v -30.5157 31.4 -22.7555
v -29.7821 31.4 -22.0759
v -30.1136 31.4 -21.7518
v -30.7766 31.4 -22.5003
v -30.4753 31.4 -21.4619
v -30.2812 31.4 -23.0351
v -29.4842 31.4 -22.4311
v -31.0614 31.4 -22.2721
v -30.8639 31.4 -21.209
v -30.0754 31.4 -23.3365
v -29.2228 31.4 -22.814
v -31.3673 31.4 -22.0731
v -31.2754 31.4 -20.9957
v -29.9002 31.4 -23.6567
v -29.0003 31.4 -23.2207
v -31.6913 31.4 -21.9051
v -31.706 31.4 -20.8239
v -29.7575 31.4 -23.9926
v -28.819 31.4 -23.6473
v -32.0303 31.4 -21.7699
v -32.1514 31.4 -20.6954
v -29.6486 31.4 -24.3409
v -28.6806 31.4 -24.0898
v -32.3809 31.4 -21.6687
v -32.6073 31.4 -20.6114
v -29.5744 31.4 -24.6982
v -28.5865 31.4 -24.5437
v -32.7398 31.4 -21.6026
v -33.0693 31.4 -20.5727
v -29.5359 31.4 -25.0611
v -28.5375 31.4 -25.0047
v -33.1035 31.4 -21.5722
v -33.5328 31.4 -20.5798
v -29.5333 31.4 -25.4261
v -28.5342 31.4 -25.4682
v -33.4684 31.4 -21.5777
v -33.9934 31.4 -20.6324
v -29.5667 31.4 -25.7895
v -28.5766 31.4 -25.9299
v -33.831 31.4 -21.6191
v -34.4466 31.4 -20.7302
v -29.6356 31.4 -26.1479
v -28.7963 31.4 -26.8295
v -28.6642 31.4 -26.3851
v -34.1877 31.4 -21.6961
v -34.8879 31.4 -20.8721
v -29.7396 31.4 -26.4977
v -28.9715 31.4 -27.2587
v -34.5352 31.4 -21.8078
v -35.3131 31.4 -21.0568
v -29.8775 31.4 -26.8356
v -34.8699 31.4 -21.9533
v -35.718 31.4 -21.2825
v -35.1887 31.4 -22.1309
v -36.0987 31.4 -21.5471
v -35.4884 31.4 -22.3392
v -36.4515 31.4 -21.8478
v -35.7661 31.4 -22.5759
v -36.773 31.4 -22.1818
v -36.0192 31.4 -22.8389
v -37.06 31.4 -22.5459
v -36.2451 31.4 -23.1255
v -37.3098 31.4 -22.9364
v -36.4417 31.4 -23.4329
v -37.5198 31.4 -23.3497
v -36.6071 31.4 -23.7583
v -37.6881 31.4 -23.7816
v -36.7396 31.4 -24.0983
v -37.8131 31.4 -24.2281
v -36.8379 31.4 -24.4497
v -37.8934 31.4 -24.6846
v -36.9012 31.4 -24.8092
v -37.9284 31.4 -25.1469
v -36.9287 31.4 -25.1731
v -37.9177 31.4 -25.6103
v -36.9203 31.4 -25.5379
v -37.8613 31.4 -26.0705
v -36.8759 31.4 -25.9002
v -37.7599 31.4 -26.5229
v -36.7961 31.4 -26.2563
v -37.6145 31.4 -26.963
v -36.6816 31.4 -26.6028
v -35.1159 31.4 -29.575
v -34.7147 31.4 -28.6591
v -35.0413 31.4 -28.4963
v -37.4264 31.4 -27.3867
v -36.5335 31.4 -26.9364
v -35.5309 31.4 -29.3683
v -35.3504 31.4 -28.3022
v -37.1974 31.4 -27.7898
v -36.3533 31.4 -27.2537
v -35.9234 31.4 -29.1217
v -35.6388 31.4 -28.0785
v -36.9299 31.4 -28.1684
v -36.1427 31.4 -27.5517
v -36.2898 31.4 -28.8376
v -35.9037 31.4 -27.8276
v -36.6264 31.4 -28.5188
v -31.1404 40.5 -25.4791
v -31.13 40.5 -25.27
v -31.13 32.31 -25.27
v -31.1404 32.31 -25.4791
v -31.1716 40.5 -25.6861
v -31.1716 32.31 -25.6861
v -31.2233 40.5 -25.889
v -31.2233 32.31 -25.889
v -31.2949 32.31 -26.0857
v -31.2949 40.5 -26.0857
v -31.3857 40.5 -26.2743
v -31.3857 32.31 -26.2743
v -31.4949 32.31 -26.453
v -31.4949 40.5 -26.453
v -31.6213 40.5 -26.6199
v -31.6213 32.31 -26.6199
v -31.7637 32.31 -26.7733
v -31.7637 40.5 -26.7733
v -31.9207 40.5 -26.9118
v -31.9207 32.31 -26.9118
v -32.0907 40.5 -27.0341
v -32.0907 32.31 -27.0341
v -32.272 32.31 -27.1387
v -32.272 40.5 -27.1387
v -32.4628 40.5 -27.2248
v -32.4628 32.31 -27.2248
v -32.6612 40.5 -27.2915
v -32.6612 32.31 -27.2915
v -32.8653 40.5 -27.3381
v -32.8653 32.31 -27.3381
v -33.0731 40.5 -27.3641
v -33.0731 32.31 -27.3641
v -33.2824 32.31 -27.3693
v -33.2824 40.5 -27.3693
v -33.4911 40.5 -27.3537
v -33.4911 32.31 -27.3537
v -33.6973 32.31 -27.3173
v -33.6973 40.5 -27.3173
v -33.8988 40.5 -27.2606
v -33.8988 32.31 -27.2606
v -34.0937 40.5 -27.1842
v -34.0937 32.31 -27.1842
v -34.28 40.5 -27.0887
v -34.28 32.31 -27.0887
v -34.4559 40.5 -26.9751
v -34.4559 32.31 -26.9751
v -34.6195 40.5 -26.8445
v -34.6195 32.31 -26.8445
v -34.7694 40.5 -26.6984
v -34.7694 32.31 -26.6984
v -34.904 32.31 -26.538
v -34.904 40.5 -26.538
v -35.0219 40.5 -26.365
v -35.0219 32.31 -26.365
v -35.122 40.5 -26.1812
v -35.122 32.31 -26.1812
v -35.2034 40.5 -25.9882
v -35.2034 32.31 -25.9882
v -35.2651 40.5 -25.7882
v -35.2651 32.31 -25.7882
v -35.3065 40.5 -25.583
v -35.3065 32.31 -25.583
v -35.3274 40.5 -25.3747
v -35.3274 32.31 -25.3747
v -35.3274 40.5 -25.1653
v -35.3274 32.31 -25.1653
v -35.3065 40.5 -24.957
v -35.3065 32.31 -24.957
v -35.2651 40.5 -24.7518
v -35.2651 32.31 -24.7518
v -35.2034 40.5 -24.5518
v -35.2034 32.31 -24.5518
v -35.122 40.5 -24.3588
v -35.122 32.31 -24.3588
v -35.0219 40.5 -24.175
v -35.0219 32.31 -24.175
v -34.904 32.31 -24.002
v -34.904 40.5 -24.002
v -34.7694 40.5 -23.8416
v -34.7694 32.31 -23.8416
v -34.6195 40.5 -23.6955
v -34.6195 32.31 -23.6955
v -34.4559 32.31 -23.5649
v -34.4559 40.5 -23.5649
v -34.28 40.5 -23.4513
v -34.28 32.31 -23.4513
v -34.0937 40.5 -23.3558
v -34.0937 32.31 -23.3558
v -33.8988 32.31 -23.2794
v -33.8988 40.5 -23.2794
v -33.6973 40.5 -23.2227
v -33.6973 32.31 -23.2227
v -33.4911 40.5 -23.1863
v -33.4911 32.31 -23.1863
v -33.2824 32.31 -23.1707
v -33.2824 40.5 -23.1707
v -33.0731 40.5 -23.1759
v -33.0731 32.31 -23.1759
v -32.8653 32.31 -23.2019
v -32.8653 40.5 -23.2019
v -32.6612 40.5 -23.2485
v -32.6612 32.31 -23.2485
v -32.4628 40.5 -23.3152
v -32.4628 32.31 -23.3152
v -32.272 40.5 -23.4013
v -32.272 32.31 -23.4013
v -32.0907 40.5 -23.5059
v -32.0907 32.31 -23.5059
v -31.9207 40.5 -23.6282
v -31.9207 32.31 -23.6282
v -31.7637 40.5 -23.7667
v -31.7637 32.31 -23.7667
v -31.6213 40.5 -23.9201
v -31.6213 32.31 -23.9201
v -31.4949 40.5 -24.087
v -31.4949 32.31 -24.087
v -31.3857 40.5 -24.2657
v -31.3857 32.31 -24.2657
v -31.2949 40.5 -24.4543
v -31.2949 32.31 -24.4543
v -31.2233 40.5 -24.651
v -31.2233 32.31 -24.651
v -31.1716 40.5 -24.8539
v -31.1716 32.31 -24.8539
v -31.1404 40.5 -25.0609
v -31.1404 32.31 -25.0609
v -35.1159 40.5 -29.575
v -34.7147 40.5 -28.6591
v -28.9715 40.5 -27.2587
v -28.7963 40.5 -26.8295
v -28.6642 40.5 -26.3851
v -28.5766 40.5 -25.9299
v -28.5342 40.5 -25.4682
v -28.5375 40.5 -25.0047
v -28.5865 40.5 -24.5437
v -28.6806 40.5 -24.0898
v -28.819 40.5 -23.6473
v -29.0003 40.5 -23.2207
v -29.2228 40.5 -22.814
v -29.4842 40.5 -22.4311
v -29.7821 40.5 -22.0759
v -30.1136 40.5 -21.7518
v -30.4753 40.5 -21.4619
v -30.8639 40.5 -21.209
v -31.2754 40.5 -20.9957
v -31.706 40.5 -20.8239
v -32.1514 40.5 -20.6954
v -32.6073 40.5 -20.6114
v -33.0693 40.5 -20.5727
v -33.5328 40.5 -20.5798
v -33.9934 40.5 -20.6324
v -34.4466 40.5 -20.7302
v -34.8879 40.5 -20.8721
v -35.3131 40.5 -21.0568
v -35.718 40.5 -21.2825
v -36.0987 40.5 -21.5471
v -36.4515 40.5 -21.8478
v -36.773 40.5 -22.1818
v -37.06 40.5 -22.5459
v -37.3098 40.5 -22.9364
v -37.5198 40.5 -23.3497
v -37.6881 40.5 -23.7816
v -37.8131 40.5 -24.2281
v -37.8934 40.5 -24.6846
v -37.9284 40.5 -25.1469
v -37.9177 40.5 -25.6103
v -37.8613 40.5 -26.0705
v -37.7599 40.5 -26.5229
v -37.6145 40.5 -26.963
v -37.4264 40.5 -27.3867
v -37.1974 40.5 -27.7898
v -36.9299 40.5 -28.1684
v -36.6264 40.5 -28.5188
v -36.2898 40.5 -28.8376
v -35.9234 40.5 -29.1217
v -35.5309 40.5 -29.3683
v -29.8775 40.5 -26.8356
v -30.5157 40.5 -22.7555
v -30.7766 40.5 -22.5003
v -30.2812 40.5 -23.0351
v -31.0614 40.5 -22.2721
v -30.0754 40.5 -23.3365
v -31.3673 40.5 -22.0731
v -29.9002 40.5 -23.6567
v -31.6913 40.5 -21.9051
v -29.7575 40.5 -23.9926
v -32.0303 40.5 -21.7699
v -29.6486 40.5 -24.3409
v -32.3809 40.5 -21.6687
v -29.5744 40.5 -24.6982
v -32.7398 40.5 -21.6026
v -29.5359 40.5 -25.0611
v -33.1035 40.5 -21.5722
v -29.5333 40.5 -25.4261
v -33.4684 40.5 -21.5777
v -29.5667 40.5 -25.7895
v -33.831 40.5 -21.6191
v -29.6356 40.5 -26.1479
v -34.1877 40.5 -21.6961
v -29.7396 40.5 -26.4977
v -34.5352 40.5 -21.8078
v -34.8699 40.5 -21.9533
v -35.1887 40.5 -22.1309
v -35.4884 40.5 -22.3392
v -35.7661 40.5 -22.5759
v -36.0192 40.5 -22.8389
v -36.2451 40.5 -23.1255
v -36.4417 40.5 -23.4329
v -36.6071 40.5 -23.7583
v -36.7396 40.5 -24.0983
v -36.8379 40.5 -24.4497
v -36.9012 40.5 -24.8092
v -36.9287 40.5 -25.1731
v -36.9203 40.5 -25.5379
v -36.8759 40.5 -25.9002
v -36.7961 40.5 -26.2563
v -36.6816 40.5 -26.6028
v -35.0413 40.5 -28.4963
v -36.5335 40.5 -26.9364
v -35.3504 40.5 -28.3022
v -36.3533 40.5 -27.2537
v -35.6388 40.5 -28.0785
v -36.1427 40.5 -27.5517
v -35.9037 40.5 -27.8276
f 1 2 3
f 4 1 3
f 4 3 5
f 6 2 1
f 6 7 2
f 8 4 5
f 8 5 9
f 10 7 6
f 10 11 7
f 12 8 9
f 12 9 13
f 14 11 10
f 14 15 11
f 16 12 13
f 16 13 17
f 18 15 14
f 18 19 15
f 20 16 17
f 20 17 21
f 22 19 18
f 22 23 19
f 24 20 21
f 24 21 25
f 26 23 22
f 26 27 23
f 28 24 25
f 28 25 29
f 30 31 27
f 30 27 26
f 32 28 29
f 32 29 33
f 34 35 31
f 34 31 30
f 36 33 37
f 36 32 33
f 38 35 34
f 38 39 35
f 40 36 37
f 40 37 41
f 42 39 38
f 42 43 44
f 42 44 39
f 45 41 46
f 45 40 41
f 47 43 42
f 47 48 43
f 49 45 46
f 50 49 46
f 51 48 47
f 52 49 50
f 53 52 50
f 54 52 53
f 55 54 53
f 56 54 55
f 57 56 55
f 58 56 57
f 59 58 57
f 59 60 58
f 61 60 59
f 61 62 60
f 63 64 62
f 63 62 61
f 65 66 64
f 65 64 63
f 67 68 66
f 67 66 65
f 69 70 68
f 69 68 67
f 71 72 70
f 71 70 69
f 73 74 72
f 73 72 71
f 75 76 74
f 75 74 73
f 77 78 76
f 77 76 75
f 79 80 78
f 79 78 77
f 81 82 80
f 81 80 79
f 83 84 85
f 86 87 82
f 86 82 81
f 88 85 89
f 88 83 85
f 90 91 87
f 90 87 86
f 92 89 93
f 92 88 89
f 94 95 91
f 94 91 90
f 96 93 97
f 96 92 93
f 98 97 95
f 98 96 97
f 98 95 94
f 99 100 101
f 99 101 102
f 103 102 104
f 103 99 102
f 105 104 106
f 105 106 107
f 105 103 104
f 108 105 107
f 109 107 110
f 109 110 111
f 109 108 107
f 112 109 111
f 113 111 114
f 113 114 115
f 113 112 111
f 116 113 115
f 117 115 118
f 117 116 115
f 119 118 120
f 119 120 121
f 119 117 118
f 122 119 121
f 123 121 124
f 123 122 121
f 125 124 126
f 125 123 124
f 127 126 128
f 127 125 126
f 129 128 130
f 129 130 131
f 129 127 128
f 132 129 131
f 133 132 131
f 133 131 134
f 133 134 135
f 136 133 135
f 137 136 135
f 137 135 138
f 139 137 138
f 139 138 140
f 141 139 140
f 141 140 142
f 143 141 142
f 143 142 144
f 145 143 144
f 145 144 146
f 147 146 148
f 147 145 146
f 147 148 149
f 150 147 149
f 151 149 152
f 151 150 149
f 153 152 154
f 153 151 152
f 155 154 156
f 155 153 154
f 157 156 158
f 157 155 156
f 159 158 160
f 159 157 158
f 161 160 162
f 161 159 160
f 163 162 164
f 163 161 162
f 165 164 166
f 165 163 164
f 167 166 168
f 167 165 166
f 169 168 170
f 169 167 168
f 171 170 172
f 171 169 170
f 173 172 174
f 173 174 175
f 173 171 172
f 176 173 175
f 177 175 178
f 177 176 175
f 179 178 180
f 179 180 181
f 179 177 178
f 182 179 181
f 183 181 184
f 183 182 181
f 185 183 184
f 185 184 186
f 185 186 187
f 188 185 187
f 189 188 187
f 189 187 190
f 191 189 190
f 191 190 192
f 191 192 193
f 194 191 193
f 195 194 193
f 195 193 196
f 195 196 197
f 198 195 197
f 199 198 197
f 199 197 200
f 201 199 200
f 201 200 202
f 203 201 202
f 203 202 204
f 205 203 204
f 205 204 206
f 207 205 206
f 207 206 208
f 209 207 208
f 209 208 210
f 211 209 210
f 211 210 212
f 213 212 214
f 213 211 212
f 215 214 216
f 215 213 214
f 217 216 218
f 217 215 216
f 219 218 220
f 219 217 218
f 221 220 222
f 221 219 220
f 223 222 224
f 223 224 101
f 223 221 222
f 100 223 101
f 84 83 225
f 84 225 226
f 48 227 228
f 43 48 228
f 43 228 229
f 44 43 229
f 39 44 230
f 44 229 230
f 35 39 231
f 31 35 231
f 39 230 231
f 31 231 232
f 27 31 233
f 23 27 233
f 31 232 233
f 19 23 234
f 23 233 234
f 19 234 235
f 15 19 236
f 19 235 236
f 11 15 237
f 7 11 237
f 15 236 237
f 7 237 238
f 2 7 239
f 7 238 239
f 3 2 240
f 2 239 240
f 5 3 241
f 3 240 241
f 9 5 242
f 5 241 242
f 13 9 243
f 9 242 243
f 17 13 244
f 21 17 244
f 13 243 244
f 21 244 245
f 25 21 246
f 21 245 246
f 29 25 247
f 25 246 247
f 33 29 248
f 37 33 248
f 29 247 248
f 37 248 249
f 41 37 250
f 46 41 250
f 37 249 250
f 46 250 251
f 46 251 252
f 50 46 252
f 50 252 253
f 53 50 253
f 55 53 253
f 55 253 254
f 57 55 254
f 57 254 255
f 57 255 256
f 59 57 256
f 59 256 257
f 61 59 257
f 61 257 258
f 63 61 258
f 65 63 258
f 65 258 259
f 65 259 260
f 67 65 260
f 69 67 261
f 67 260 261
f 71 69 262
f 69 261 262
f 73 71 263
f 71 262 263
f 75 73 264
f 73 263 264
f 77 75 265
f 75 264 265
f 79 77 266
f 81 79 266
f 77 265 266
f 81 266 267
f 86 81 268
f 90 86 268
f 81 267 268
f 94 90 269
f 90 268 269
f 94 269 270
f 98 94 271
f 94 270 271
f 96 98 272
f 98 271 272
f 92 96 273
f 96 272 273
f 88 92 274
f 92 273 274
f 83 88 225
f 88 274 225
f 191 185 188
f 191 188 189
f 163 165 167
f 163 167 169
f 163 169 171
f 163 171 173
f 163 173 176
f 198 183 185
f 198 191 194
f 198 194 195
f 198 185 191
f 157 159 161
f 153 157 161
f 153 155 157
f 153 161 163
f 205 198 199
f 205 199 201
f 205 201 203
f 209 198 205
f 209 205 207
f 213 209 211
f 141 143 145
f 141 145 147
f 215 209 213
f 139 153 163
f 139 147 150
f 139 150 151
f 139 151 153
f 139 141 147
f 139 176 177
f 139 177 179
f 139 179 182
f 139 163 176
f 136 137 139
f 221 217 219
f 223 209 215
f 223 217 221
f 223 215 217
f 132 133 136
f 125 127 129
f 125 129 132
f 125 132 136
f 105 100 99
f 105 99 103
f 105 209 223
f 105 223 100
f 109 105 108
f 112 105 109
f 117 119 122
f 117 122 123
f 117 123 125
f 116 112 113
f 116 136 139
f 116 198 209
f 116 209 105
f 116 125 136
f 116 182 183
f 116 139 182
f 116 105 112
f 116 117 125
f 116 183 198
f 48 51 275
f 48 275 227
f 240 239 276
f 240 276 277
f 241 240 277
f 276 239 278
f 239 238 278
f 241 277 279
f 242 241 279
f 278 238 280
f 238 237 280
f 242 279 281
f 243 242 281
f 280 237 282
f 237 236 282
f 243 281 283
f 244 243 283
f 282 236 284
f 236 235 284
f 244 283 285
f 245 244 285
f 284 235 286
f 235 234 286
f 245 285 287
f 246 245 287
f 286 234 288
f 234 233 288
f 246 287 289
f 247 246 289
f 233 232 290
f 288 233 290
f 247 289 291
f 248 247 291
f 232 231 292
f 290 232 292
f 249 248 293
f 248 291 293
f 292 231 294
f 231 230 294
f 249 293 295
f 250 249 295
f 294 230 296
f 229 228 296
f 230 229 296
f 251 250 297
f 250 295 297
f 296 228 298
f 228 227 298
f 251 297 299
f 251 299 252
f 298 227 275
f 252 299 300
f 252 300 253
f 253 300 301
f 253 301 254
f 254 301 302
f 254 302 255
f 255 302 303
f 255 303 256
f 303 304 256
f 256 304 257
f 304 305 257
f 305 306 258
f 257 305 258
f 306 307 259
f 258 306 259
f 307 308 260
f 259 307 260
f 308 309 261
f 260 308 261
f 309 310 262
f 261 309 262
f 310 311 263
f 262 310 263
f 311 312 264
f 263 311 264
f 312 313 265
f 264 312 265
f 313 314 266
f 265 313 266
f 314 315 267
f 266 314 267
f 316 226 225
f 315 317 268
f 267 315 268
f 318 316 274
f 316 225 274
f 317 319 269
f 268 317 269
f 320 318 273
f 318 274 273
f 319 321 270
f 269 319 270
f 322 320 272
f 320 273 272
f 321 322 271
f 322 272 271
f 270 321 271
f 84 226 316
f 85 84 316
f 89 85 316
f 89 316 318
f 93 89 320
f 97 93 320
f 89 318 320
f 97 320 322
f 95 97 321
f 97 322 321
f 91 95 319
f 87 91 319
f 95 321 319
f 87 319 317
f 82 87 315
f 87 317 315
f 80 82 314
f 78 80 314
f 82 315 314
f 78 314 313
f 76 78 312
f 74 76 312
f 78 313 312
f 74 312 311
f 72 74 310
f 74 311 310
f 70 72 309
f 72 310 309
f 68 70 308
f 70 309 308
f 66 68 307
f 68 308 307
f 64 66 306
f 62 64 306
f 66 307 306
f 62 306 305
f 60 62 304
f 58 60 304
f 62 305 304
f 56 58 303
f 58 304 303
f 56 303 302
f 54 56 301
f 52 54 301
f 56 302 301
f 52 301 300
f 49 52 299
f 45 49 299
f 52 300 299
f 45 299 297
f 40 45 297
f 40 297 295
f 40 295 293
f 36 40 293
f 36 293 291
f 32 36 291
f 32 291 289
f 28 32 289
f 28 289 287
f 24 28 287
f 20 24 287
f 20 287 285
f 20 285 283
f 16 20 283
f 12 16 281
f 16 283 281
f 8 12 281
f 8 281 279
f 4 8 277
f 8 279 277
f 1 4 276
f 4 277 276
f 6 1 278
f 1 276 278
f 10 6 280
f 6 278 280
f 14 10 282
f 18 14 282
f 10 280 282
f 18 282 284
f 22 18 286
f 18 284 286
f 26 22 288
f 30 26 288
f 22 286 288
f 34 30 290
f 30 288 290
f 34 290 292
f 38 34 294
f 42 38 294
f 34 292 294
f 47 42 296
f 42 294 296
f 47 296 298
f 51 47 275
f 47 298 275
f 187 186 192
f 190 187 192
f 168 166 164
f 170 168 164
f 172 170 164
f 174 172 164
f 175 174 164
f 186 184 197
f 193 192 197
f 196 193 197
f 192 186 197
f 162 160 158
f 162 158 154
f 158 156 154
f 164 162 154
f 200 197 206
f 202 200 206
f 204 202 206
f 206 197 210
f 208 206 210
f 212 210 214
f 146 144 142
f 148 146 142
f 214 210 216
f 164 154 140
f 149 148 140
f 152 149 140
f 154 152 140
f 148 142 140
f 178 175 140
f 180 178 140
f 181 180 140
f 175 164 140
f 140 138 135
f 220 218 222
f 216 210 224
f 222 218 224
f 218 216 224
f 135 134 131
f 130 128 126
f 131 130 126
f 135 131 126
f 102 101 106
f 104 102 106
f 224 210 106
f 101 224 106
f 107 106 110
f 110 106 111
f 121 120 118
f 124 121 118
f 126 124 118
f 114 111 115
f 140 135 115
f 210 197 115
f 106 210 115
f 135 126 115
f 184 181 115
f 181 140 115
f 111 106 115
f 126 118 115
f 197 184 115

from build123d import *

# Parameters (mm, degrees)
EXTRUDE_THIN_START                         = 40.5
EXTRUDE_THIN_LIGHT_SENSOR_TUBE_DEPTH       = 9.1
BOSS_EXTRUDE_START                         = 40.5
LIGHT_SENSOR_TUBE_OUTLINE_3_R              = 2.1
BOSS_EXTRUDE_LIGHT_SENSOR_LIGHT_PIPE_DEPTH = 8.19


with BuildPart() as part:
    # Light sensor tube outline → Extrude-Thin light sensor tube (new body)
    with BuildSketch(Plane(origin=(0, 0, 0), x_dir=(1, 0, 0), z_dir=(0, 1, 0)).offset(EXTRUDE_THIN_START)):
        with BuildLine():
            ThreePointArc((-34.714683023, 28.659058324), (-34.535157443, 21.80783824), (-29.877535995, 26.83556223))
            Line((-29.877535995, 26.83556223), (-28.971464642, 27.258687157))
            ThreePointArc((-28.971464642, 27.258687157), (-34.887902697, 20.872118846), (-35.115948705, 29.575020033))
            Line((-35.115948705, 29.575020033), (-34.714683023, 28.659058324))
        make_face()
    extrude(amount=-EXTRUDE_THIN_LIGHT_SENSOR_TUBE_DEPTH)


with BuildPart() as body_2:
    # Light sensor tube outline<3> → Boss-Extrude light sensor light pipe (new body)
    with BuildSketch(Plane(origin=(0, 0, 0), x_dir=(1, 0, 0), z_dir=(0, 1, 0)).offset(BOSS_EXTRUDE_START)):
        with Locations((-33.23, 25.27)):
            Circle(LIGHT_SENSOR_TUBE_OUTLINE_3_R)
    extrude(amount=-BOSS_EXTRUDE_LIGHT_SENSOR_LIGHT_PIPE_DEPTH)


solid = Compound([part.part, body_2.part])
